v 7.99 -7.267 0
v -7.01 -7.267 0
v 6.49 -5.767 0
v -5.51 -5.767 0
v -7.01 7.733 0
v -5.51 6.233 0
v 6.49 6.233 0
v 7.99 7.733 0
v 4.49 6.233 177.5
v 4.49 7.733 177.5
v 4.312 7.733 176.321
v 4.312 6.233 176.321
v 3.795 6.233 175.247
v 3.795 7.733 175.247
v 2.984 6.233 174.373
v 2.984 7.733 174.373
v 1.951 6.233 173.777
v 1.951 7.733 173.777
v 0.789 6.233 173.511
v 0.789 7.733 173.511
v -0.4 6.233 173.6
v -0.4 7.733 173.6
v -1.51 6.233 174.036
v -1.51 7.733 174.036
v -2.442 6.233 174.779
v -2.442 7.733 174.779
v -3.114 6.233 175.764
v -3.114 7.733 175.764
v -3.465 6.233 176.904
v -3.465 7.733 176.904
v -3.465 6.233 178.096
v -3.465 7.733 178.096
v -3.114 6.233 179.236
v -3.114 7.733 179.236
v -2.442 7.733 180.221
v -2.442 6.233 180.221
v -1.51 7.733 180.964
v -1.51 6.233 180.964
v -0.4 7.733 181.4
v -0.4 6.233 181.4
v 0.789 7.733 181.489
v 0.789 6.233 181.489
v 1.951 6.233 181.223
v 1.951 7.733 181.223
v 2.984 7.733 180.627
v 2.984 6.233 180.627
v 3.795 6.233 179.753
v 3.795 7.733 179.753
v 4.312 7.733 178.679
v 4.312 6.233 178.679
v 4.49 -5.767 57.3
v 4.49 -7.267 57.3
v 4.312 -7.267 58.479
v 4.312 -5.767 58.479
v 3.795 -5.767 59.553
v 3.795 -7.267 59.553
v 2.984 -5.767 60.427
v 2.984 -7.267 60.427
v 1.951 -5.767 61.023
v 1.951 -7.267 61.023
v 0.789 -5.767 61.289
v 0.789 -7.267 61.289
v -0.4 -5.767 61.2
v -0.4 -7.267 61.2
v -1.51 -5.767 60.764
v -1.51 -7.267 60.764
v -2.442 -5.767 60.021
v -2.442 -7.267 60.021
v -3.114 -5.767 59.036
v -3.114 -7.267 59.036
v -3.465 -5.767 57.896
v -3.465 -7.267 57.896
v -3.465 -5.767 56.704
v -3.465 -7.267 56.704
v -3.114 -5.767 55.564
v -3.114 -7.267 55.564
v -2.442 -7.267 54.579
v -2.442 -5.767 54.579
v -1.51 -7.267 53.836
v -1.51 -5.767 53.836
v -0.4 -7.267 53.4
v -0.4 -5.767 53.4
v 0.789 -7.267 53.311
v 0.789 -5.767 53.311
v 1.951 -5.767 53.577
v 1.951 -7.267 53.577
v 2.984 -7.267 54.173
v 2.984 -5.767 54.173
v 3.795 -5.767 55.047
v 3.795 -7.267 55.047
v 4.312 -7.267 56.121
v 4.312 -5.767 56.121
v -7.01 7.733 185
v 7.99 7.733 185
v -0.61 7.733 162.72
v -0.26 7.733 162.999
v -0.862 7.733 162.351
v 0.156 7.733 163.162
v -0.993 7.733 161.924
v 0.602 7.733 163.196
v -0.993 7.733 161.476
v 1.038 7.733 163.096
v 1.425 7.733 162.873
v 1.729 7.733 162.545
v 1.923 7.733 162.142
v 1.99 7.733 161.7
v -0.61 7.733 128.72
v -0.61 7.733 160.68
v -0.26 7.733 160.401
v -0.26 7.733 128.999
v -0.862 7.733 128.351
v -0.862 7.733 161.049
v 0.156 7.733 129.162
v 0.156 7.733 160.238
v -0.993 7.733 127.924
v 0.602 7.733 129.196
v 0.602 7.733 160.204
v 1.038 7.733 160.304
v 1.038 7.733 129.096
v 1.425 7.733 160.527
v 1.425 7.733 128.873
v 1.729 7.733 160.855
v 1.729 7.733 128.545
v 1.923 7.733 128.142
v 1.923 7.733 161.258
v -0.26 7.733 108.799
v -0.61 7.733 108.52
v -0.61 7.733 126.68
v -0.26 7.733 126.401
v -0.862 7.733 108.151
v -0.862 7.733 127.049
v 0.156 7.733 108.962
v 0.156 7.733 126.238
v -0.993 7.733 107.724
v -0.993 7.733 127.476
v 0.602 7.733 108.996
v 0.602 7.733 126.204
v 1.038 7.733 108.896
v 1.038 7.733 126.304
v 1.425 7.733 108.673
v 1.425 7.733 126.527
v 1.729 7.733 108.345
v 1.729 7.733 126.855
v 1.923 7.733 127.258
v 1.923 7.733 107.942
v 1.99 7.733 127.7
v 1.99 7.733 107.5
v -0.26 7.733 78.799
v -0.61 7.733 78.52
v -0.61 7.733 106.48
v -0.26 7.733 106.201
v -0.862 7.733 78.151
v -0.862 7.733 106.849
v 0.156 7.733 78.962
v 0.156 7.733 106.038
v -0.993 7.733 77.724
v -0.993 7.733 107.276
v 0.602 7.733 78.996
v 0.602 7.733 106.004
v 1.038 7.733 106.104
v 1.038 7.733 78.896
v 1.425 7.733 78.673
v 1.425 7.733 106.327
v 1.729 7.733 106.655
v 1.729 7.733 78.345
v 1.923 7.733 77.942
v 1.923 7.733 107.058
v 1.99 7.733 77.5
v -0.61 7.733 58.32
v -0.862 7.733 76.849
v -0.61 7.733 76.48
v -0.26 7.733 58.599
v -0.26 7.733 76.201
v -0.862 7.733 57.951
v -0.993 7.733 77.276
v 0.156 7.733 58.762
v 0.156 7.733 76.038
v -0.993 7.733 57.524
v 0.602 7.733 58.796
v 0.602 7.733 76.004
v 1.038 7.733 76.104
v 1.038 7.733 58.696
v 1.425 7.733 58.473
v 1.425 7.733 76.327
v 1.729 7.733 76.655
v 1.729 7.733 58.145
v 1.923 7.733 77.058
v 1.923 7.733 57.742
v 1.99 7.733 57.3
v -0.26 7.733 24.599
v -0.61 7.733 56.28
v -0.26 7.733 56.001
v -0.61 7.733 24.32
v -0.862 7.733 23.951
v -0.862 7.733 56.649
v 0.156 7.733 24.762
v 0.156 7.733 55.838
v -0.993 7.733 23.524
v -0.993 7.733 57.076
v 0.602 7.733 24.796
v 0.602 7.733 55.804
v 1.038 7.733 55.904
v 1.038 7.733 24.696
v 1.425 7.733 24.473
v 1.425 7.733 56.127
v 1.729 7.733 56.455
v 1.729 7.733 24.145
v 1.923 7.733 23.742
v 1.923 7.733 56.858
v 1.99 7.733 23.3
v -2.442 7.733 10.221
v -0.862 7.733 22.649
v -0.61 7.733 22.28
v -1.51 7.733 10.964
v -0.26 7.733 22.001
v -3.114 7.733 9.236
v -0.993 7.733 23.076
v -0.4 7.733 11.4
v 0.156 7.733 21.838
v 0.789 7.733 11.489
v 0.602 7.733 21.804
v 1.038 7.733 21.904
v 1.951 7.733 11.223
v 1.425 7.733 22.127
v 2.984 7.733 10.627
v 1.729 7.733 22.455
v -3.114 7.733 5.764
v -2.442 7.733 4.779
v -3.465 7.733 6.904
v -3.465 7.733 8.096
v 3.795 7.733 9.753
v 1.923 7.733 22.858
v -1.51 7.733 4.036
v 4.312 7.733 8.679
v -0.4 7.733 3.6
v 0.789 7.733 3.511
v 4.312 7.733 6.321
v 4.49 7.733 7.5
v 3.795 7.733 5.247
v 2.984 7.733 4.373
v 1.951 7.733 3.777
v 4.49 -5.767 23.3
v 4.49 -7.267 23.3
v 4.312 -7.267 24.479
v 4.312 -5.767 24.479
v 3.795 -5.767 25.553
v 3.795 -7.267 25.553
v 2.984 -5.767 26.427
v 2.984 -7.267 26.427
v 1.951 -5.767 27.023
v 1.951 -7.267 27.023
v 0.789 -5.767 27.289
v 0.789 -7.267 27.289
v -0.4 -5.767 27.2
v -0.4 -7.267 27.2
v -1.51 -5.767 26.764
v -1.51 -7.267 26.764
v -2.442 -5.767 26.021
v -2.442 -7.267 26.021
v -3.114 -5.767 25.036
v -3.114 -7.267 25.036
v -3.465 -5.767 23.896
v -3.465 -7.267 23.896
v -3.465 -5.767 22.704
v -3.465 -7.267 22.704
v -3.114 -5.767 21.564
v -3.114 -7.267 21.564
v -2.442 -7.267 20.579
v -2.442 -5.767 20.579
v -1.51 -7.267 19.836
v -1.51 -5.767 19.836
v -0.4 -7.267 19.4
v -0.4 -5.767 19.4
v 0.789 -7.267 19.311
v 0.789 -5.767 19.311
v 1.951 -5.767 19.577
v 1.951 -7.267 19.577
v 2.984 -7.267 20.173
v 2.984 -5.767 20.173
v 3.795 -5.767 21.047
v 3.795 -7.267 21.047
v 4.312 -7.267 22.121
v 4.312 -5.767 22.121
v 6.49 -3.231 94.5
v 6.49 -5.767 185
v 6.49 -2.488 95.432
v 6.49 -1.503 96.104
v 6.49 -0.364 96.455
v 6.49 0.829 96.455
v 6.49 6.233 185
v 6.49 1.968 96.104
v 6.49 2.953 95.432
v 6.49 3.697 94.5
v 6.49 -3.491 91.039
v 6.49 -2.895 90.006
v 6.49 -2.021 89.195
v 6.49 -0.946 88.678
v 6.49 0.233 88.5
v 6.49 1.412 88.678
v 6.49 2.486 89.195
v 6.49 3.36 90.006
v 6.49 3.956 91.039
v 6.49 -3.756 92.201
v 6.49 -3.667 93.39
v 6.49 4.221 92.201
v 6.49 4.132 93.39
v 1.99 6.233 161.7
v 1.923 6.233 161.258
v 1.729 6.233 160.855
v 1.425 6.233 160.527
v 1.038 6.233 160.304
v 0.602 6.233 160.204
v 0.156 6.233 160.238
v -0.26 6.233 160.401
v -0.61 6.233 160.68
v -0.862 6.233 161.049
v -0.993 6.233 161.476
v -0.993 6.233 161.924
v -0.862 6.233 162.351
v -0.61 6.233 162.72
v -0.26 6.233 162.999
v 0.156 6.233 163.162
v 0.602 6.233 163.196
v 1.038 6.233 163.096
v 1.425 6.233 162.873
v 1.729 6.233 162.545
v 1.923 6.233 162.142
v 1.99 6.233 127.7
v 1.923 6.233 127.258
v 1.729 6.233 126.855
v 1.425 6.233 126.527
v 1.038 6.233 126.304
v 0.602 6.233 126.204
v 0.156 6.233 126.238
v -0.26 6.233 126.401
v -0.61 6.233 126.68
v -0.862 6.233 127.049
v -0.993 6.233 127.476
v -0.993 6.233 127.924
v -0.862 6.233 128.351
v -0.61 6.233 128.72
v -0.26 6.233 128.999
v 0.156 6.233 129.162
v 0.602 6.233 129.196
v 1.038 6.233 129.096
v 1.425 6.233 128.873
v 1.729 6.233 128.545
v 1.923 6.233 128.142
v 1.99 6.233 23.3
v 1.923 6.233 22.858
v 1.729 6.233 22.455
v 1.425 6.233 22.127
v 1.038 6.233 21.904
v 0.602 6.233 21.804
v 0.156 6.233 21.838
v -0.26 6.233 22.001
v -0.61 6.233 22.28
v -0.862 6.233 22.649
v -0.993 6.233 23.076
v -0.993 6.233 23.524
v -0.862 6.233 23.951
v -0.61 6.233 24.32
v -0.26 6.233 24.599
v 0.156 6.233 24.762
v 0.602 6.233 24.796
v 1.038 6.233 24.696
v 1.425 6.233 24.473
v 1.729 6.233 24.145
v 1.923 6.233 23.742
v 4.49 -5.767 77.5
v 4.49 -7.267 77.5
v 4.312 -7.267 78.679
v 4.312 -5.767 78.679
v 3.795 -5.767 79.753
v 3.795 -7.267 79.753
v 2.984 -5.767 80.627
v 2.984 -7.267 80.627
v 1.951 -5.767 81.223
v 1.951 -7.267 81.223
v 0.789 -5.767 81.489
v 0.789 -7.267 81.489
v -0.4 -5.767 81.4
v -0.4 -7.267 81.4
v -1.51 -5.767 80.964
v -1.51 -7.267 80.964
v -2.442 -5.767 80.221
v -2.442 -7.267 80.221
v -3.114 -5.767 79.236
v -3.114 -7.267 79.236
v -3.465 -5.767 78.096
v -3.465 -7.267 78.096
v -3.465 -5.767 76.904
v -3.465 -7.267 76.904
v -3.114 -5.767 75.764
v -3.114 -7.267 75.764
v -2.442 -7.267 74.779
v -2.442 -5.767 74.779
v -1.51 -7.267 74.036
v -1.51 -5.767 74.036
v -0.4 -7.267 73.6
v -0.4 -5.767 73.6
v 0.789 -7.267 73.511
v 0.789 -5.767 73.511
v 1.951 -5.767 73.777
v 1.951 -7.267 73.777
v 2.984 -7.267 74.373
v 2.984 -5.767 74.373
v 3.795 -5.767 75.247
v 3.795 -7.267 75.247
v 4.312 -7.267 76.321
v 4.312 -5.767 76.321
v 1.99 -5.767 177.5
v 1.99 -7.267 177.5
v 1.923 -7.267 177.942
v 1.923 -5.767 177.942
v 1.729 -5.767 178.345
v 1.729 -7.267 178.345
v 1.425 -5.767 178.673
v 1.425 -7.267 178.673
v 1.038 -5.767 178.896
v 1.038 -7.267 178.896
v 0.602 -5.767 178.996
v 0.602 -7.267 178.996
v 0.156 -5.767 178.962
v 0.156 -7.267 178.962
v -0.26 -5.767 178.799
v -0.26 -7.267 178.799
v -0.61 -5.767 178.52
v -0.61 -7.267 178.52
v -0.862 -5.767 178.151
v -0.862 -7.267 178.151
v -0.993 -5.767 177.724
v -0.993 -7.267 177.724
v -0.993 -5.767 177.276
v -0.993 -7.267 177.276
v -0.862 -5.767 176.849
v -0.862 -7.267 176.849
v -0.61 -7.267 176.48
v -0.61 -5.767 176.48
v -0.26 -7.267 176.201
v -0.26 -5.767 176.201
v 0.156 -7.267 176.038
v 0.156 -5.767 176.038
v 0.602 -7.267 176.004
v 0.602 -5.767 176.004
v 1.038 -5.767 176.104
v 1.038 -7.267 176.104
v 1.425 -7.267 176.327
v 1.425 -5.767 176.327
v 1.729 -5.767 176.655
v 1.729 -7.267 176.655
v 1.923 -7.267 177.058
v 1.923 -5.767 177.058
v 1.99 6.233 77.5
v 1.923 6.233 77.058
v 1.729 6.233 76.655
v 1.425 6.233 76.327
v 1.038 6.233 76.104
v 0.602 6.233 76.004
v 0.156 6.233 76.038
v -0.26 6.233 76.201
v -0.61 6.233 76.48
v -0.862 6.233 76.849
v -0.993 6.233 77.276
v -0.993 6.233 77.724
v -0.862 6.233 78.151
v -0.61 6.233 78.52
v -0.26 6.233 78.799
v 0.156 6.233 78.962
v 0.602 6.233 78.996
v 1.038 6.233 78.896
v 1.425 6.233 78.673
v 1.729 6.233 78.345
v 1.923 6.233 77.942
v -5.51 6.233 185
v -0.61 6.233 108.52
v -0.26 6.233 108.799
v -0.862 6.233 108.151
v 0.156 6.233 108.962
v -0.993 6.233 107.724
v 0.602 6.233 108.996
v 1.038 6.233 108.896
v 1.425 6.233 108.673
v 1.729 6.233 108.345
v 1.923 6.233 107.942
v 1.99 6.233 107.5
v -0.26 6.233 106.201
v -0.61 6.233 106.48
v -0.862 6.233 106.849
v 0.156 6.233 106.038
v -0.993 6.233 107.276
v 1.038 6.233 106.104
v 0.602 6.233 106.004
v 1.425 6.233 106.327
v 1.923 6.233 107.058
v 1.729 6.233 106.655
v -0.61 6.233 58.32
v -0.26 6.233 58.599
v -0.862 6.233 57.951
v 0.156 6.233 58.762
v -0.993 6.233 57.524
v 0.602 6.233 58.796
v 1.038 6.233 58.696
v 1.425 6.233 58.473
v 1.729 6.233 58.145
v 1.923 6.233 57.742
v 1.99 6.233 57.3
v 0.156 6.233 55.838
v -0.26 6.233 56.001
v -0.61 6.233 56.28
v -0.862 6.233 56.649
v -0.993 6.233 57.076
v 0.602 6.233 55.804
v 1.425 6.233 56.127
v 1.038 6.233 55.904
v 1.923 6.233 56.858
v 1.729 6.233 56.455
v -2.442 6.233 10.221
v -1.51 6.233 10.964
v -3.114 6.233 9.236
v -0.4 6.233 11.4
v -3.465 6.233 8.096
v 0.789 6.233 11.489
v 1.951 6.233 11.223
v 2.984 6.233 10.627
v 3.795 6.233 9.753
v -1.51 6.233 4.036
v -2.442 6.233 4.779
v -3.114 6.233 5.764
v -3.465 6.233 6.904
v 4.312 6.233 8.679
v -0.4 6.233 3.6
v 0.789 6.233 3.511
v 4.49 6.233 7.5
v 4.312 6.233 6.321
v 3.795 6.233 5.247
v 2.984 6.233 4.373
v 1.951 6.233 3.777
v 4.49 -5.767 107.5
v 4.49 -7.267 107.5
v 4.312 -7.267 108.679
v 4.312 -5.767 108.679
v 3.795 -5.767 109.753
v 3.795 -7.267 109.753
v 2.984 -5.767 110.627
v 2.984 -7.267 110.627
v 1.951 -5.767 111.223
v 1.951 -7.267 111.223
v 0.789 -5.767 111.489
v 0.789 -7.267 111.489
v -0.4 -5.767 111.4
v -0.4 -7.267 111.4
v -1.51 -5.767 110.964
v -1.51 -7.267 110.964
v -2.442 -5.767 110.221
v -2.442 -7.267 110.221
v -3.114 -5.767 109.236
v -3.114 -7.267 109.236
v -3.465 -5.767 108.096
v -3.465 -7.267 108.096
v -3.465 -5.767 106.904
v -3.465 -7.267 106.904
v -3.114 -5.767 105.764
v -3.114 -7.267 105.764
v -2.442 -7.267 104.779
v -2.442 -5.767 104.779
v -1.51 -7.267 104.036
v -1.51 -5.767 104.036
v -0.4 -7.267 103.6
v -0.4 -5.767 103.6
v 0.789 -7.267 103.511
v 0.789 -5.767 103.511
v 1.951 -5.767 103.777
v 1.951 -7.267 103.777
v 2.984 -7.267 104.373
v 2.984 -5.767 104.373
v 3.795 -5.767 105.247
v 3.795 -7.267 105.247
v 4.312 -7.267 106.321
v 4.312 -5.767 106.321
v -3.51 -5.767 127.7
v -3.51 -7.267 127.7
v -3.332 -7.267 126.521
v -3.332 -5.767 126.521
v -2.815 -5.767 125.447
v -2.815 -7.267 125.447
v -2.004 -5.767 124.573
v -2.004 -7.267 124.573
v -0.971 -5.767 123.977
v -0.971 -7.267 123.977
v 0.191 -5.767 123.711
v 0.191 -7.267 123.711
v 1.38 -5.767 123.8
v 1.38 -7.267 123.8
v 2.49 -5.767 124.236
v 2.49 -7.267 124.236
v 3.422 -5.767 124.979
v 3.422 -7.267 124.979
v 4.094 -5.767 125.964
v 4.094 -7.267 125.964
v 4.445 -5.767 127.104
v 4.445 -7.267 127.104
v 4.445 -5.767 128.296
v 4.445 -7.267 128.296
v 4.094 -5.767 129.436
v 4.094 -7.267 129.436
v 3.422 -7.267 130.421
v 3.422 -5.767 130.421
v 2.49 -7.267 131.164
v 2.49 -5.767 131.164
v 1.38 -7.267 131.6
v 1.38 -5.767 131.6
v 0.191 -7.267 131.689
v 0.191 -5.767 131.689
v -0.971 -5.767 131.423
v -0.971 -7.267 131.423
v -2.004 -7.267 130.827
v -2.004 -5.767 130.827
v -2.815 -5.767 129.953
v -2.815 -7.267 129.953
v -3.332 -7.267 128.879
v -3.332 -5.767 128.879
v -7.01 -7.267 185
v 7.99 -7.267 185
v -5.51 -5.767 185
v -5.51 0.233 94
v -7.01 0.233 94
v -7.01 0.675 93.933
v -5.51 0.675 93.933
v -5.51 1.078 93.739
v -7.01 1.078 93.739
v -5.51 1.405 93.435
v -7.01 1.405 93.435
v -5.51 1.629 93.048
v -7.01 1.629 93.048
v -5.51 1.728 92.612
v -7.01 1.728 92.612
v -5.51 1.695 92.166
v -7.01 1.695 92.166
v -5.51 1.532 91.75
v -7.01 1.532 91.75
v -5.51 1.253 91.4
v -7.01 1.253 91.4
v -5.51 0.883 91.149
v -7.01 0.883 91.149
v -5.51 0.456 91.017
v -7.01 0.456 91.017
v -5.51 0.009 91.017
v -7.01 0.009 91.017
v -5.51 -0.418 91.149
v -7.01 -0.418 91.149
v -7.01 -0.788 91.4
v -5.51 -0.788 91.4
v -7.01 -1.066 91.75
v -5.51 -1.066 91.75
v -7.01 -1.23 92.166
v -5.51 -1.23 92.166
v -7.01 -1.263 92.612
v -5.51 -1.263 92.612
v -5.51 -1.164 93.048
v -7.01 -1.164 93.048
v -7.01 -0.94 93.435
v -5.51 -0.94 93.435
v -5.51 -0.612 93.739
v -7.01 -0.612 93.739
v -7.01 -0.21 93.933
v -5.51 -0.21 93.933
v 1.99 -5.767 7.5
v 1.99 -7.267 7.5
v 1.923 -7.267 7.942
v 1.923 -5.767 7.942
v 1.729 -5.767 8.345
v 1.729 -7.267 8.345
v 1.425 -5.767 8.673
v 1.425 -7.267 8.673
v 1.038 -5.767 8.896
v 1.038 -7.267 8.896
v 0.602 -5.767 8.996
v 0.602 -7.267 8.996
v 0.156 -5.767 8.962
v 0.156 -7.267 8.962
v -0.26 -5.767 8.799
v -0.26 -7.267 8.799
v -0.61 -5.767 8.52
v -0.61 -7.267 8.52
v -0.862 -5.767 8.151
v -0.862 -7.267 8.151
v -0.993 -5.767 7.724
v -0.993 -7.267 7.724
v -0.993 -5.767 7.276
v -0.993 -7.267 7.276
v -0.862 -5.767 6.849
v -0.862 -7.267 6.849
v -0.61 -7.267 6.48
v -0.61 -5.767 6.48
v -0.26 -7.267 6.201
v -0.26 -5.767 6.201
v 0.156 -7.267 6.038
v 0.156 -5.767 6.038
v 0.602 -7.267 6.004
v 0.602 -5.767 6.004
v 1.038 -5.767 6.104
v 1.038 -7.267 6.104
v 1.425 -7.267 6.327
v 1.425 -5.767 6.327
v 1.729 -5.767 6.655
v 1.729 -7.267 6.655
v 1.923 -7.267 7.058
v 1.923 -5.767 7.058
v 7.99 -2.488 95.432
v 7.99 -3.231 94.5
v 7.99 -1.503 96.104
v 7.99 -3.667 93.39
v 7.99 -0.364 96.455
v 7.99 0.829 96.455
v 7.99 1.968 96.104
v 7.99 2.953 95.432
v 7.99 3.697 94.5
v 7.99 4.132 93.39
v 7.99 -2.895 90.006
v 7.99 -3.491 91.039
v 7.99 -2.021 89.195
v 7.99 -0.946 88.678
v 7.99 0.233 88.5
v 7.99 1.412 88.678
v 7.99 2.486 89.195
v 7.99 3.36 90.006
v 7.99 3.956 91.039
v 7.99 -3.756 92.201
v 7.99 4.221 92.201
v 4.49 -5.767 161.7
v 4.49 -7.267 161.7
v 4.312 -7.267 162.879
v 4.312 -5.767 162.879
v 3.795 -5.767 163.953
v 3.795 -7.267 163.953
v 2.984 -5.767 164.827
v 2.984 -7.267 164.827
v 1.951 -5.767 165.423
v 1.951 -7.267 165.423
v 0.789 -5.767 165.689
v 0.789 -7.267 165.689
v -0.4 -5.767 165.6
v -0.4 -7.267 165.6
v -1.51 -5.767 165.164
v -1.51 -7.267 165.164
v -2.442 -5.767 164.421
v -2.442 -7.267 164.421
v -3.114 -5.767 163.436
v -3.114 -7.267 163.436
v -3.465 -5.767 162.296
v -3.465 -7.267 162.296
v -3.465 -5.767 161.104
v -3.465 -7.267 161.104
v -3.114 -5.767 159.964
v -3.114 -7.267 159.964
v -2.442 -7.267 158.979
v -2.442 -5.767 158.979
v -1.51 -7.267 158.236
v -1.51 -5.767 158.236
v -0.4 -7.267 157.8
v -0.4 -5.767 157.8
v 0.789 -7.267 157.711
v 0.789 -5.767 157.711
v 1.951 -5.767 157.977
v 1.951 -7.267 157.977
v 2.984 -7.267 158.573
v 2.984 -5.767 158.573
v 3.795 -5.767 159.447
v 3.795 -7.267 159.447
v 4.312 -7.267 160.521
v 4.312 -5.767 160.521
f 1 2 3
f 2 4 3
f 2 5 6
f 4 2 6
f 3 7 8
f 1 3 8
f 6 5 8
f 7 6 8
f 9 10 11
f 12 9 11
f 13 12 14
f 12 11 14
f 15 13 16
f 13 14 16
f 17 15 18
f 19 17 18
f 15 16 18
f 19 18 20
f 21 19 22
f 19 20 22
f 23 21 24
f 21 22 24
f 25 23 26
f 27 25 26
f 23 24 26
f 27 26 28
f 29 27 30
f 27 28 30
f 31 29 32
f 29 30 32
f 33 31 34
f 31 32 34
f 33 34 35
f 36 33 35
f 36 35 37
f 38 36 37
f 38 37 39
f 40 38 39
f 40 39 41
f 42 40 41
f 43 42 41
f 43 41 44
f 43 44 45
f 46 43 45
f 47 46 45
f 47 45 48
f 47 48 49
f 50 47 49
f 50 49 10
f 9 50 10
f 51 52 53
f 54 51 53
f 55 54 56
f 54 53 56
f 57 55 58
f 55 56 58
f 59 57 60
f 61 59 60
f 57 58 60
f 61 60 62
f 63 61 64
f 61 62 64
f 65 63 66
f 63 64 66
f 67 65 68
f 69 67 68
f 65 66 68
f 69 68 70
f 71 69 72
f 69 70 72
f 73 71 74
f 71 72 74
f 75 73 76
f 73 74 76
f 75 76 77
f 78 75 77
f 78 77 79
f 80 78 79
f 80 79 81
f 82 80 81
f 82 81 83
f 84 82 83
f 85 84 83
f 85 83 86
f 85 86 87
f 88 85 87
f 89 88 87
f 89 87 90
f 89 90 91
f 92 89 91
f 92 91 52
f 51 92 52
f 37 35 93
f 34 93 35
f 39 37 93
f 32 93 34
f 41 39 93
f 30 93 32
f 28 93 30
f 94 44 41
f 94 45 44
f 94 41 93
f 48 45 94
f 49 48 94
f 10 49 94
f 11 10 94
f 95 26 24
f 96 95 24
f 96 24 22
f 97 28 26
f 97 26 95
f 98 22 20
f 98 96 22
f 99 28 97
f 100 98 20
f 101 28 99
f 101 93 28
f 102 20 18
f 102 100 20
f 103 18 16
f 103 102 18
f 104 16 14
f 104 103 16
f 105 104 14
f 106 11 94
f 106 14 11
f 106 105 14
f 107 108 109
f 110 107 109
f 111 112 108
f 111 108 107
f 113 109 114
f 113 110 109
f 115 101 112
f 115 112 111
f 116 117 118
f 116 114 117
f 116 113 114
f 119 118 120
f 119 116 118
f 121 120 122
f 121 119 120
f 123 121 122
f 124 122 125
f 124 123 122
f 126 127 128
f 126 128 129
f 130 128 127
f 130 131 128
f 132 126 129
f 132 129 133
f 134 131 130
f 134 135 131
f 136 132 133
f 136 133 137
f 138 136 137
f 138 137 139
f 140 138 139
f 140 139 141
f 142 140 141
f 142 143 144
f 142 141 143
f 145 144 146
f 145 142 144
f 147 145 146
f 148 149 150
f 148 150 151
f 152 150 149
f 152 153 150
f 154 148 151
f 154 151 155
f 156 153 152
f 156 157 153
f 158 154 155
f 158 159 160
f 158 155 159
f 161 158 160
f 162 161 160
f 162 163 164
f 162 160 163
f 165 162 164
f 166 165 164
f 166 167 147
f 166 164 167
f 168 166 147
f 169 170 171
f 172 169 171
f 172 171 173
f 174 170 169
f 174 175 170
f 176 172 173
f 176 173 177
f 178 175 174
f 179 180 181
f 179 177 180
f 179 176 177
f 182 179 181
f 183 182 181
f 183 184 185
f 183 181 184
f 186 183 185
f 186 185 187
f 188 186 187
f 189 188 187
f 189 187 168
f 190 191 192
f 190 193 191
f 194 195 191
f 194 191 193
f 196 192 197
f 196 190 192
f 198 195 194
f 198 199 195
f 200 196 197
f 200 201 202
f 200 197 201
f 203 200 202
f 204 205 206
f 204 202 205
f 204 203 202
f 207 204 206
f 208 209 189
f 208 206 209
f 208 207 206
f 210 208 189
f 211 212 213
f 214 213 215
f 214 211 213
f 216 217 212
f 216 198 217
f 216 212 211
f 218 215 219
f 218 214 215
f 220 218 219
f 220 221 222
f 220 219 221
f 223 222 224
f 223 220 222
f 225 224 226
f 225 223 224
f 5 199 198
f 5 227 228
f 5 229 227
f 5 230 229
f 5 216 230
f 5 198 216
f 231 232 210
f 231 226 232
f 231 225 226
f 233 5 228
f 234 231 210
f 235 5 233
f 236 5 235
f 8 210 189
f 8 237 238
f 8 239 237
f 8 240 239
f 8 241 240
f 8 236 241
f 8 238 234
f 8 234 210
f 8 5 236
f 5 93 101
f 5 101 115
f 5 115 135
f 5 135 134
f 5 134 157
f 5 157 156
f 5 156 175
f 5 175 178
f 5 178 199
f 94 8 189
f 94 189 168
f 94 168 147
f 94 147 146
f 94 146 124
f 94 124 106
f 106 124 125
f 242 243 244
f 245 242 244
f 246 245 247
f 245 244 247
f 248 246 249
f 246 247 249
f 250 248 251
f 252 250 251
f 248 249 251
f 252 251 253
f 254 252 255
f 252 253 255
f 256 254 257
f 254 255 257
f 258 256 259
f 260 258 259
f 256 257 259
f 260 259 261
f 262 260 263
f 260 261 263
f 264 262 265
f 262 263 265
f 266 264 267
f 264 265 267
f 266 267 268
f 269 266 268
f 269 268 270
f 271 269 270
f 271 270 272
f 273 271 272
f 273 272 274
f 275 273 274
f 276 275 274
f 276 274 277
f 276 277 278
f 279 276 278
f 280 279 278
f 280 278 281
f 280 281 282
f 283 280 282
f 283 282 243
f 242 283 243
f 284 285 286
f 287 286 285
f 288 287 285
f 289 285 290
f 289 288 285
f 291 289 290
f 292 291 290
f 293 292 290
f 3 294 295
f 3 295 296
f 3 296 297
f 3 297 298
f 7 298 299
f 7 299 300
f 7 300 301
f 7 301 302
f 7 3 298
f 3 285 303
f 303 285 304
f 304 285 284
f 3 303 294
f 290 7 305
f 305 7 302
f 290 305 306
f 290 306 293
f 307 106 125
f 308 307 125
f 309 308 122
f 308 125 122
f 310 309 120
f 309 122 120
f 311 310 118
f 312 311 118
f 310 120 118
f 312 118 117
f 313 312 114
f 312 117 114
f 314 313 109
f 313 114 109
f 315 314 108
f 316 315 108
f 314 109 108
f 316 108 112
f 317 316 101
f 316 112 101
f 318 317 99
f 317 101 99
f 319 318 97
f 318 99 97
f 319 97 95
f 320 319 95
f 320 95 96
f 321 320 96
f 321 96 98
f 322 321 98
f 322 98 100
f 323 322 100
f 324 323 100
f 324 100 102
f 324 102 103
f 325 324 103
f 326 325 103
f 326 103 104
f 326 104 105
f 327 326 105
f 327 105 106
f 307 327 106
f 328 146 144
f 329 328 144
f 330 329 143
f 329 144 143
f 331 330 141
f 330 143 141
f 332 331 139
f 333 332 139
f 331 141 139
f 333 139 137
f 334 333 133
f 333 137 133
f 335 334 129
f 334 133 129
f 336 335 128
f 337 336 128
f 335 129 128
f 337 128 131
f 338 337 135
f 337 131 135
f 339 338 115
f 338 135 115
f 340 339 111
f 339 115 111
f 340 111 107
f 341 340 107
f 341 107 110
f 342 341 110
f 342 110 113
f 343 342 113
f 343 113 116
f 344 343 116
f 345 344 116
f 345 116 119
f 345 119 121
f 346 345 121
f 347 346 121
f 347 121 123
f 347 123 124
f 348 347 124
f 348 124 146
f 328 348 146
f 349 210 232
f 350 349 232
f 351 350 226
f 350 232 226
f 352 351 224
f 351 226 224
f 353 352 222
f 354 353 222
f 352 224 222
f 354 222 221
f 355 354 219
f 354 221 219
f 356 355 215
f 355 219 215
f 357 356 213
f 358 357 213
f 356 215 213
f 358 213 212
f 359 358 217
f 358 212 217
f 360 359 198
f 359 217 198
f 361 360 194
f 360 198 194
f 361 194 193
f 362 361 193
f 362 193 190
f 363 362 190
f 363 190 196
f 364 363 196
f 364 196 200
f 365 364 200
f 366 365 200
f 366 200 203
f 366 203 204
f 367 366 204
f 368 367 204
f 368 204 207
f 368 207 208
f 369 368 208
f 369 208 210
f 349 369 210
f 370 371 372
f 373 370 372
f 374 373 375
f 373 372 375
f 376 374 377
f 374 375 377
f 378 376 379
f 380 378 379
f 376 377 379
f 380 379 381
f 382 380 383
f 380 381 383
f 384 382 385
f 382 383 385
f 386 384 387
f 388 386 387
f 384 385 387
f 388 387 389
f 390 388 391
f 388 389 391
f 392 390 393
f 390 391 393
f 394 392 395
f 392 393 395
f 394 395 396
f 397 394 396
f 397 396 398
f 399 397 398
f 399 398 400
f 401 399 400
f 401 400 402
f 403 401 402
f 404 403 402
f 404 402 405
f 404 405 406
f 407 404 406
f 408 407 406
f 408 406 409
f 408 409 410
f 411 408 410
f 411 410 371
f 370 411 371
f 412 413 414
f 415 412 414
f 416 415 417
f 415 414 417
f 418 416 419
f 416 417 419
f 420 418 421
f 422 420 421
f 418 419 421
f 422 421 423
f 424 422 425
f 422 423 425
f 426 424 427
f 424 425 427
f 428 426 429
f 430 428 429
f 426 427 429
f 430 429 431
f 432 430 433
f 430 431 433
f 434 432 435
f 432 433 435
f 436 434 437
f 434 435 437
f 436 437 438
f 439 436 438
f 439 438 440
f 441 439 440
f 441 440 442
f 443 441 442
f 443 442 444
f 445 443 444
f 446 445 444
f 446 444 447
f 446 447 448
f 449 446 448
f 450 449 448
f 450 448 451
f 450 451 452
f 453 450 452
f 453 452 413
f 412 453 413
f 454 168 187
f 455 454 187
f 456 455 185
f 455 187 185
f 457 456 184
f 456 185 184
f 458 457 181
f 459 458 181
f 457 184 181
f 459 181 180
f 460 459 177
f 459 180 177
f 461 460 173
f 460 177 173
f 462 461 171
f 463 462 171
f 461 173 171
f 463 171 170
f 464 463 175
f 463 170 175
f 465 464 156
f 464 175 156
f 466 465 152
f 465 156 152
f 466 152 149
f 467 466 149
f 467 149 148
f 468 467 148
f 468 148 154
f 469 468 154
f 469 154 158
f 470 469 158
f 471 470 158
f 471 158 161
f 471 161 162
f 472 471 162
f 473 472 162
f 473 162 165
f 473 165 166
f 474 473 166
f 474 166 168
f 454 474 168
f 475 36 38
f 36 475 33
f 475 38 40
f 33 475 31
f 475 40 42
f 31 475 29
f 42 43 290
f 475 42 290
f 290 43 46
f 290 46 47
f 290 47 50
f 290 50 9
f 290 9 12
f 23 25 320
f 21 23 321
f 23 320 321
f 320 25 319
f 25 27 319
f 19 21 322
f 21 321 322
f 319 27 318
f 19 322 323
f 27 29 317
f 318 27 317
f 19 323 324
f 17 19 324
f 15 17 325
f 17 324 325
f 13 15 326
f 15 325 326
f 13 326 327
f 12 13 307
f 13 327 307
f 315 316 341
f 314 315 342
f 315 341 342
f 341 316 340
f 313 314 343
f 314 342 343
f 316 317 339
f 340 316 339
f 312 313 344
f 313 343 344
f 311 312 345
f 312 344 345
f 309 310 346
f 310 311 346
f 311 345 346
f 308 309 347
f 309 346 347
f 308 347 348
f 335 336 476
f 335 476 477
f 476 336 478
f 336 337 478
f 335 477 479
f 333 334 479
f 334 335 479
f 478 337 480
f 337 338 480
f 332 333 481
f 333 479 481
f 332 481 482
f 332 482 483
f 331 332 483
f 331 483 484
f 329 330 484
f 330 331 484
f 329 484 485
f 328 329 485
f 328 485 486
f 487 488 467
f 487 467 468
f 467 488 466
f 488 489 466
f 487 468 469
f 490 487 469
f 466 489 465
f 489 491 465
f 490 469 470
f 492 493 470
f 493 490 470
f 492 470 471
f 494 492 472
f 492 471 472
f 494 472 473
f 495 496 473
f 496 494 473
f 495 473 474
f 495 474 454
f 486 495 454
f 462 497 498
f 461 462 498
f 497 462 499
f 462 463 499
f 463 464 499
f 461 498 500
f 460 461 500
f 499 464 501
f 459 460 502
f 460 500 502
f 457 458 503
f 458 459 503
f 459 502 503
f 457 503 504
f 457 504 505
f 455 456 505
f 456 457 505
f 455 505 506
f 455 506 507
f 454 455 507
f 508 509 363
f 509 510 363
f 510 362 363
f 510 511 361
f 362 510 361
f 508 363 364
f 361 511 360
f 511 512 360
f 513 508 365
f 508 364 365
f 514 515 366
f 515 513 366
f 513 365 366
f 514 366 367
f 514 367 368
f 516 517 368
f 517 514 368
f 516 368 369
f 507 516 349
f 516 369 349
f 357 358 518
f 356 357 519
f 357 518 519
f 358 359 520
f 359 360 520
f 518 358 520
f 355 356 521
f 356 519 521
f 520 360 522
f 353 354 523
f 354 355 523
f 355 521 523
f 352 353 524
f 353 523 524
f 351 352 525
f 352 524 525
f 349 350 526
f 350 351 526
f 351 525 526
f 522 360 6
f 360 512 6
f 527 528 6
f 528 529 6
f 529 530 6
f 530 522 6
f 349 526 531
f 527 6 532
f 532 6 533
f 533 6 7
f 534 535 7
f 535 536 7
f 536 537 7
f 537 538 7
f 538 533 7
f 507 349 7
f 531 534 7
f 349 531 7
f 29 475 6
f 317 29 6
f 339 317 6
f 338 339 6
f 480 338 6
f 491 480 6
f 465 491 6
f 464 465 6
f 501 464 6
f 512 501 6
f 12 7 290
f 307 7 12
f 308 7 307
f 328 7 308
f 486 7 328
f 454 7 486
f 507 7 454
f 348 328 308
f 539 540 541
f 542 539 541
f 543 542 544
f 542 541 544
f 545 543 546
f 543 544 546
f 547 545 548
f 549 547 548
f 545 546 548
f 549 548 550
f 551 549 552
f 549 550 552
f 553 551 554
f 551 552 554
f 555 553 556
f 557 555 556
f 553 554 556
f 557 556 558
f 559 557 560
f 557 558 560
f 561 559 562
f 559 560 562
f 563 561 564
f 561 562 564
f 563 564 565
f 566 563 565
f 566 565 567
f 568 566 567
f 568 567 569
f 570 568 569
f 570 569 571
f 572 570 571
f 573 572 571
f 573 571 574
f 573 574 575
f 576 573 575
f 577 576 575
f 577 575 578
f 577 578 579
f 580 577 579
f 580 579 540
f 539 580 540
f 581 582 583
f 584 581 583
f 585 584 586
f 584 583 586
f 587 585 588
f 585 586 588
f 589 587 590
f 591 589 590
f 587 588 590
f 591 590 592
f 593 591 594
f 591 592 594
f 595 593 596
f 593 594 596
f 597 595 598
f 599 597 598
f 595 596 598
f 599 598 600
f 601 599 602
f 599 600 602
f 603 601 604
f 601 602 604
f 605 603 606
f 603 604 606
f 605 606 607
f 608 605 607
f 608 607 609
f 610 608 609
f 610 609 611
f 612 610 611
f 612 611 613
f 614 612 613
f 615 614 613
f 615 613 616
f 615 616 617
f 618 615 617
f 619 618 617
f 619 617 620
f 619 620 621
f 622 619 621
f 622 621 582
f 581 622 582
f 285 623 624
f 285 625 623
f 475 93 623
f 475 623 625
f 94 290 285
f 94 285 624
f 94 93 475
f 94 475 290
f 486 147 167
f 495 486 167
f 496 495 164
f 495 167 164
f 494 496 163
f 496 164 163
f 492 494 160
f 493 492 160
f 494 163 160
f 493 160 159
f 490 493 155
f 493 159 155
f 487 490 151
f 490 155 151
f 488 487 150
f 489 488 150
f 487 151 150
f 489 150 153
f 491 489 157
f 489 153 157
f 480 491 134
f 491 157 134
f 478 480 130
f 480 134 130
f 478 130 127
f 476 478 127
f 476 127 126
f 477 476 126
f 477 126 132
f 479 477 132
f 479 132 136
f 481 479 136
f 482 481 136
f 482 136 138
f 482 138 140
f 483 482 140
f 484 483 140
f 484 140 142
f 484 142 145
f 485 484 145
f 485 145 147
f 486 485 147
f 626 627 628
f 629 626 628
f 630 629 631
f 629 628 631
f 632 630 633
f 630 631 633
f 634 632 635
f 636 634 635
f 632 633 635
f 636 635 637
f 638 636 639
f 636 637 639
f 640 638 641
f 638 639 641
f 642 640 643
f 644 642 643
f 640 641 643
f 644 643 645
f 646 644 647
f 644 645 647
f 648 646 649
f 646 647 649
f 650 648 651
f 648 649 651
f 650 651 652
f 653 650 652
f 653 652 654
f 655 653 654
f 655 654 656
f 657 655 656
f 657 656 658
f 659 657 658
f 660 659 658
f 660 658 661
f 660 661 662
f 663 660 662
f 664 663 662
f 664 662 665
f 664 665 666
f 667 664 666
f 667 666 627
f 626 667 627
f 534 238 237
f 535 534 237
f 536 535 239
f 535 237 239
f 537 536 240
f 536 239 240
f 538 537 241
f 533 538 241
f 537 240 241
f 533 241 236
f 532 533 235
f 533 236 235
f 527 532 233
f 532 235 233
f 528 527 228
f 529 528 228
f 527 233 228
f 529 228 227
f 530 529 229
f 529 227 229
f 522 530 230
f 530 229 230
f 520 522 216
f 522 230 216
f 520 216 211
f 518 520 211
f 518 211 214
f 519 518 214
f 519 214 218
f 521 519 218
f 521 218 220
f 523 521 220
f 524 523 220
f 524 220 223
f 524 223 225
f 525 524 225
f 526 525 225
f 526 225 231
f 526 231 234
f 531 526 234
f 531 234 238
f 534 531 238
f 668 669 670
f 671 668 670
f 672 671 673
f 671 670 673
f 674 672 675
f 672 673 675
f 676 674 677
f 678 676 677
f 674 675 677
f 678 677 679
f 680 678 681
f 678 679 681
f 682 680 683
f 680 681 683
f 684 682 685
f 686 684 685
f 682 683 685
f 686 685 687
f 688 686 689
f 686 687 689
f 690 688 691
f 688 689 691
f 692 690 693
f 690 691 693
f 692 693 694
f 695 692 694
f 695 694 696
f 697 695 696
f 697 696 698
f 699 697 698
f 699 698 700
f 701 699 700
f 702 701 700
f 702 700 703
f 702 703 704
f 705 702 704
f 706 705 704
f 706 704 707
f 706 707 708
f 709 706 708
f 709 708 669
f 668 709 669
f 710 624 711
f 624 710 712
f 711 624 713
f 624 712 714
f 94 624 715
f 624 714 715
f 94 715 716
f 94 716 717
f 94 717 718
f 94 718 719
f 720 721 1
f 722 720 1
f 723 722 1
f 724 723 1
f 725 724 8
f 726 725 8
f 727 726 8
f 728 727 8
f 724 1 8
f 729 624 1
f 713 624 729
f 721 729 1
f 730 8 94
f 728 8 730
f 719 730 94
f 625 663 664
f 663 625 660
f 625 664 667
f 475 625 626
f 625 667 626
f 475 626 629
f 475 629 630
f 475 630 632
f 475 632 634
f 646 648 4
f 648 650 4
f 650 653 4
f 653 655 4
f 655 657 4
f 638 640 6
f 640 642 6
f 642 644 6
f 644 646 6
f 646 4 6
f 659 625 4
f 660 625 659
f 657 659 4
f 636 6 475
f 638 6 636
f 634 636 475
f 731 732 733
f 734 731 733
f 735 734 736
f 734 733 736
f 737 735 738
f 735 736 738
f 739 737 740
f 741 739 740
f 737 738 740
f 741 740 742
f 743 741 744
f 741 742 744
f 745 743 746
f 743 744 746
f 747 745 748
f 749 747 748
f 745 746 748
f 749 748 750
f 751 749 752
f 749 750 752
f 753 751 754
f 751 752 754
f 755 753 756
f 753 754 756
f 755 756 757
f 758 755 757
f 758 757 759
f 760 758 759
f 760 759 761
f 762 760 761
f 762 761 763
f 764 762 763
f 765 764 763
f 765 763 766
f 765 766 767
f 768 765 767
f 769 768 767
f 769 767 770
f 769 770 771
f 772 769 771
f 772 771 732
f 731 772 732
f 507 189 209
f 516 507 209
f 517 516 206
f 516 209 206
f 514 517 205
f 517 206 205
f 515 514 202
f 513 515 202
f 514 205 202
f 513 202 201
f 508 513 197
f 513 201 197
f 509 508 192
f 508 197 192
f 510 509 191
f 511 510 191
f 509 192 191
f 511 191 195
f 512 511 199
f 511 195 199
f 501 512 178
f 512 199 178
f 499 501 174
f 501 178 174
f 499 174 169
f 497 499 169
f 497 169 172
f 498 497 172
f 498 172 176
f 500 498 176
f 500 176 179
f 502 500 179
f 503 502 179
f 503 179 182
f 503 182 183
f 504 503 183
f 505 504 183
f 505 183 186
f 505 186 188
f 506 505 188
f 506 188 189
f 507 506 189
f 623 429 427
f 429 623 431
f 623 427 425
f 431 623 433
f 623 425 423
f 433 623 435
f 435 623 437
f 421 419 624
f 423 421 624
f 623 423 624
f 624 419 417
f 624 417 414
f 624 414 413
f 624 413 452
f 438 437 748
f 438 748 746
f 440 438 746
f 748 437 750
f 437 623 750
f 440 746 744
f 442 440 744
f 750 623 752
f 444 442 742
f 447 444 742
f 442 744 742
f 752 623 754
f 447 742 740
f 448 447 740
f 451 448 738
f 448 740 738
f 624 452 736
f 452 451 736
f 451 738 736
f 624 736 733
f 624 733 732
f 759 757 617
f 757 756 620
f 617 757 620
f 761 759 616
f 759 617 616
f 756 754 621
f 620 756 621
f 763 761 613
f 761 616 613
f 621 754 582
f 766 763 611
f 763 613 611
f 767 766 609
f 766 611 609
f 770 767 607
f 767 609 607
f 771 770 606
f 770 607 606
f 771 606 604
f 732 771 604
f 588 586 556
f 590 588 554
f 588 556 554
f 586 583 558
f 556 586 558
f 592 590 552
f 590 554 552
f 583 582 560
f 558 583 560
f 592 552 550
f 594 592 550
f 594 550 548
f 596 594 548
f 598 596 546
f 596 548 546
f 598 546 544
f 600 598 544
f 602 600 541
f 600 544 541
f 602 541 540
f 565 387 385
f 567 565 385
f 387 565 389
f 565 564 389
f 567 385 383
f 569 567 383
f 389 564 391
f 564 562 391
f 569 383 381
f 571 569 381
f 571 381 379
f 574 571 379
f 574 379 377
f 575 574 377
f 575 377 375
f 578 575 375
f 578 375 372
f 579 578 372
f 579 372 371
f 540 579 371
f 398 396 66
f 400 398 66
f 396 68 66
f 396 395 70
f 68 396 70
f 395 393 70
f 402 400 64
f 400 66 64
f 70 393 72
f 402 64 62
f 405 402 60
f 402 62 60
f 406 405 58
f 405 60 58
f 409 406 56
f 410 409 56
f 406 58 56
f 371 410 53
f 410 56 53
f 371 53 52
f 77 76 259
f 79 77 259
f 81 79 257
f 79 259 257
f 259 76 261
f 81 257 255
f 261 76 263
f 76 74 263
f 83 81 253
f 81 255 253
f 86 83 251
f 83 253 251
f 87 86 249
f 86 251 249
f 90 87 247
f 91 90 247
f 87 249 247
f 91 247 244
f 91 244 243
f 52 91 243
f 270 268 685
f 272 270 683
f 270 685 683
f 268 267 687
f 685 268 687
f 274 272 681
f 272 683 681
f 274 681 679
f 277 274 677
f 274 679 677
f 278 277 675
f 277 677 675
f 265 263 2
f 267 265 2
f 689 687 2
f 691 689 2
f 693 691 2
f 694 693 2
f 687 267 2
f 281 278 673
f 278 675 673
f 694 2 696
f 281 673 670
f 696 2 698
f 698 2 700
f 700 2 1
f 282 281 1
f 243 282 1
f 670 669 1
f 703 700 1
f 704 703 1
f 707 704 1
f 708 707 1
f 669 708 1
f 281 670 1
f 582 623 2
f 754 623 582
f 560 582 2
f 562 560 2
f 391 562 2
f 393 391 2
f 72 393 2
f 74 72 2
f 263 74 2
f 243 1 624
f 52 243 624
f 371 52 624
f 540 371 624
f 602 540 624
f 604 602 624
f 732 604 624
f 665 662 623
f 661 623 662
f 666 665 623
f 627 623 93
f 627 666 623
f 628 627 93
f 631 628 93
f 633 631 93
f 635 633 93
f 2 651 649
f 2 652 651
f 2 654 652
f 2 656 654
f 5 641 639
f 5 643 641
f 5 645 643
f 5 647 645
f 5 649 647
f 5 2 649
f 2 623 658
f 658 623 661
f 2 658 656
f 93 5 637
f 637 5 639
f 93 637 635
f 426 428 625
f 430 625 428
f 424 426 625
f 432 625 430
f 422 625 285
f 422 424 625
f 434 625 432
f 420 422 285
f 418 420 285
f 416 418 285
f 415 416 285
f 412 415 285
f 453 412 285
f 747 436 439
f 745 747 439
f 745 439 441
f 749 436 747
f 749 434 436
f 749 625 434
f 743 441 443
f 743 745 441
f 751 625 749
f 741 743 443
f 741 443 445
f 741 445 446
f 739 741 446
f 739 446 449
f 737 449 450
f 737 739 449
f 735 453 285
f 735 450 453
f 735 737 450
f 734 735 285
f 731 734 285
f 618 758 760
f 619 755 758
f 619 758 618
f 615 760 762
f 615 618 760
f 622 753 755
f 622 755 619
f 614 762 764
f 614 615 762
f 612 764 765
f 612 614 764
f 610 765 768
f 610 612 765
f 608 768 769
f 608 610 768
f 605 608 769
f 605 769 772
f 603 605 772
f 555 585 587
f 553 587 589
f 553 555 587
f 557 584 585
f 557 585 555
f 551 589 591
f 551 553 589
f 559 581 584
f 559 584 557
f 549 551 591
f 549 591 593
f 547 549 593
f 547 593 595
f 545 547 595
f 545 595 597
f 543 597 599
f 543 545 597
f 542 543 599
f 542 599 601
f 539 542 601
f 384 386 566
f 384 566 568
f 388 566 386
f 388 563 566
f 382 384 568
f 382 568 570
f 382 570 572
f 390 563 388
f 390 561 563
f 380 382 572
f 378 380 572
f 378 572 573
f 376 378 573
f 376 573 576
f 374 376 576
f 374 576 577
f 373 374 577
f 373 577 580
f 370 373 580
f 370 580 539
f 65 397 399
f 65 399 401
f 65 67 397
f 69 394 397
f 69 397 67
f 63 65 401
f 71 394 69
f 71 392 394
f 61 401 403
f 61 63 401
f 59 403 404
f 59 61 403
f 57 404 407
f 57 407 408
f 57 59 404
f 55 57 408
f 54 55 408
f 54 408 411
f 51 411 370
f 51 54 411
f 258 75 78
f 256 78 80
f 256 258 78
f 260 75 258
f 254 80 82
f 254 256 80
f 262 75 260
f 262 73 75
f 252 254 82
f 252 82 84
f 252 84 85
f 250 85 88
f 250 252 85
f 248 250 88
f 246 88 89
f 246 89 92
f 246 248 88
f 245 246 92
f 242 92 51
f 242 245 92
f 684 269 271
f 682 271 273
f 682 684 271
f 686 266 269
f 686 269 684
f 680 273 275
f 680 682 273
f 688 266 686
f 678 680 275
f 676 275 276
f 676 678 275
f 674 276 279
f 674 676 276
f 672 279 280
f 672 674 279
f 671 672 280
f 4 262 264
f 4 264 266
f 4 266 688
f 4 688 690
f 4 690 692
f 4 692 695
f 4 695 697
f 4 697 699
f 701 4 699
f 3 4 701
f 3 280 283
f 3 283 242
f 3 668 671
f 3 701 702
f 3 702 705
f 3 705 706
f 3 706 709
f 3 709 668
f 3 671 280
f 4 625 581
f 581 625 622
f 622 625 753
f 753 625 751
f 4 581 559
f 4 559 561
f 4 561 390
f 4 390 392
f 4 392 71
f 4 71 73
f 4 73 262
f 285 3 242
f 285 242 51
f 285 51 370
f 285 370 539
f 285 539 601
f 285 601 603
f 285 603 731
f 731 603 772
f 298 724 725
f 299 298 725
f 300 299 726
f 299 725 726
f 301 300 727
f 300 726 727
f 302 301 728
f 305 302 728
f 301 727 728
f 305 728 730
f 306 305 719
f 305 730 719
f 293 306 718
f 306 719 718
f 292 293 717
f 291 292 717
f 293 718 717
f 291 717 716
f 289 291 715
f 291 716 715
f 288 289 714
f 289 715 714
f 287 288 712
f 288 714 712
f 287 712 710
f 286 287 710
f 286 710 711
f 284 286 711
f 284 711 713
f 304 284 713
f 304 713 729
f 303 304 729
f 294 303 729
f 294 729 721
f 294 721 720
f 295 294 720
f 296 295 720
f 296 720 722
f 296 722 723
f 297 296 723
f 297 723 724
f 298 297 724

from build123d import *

# Parameters (mm, degrees)
SKETCH_1_W           = 15
SKETCH_1_H           = 15
SKETCH_1_W_2         = 12
SKETCH_1_H_2         = 12
EXTRUDE_2_DEPTH      = 185
SKETCH_2_R           = 4
CUT_EXTRUDE_1_DEPTH  = 10
SKETCH_3_R           = 1.5
CUT_EXTRUDE_2_DEPTH  = 10
SKETCH_4_R           = 4
CUT_EXTRUDE_3_DEPTH  = 10
SKETCH_5_R           = 1.5
CUT_EXTRUDE_4_DEPTH  = 10
SKETCH_6_R           = 1.5
CUT_EXTRUDE_5_DEPTH  = 10
SKETCH_7_R           = 4
CUT_EXTRUDE_6_DEPTH  = 10
SKETCH_8_R           = 1.5
CUT_EXTRUDE_7_DEPTH  = 10
SKETCH_9_R           = 1.5
CUT_EXTRUDE_8_DEPTH  = 10
SKETCH_10_R          = 4
CUT_EXTRUDE_9_DEPTH  = 10
SKETCH_11_R          = 4
CUT_EXTRUDE_10_DEPTH = 10
SKETCH_12_R          = 1.5
CUT_EXTRUDE_11_DEPTH = 10
SKETCH_14_R          = 1.5
CUT_EXTRUDE_12_DEPTH = 10
SKETCH_15_R          = 4
CUT_EXTRUDE_13_DEPTH = 10
SKETCH_16_R          = 4
CUT_EXTRUDE_14_DEPTH = 10
SKETCH_18_R          = 1.5
CUT_EXTRUDE_15_DEPTH = 10
SKETCH_19_R          = 1.5
CUT_EXTRUDE_16_DEPTH = 10
SKETCH_20_R          = 4
CUT_EXTRUDE_17_DEPTH = 10
SKETCH_21_R          = 4
CUT_EXTRUDE_18_DEPTH = 10


with BuildPart() as part:
    # ｽｹｯﾁ1 → ﾎﾞｽ - 押し出し2 (new body)
    with BuildSketch(Plane.XY):
        with Locations((0.489915859, 0.232626086)):
            Rectangle(SKETCH_1_W, SKETCH_1_H)
        with Locations((0.489915859, 0.232626086)):
            Rectangle(SKETCH_1_W_2, SKETCH_1_H_2, mode=Mode.SUBTRACT)
    extrude(amount=EXTRUDE_2_DEPTH)

    # ｽｹｯﾁ2 → ｶｯﾄ - 押し出し1 (cut)
    with BuildSketch(Plane(origin=(0, 7.732626086, 0), x_dir=(1, 0, 0), z_dir=(0, 1, 0))):
        with Locations((0.489915859, -177.5)):
            Circle(SKETCH_2_R)
    extrude(amount=-CUT_EXTRUDE_1_DEPTH, mode=Mode.SUBTRACT)

    # ｽｹｯﾁ3 → ｶｯﾄ - 押し出し2 (cut)
    with BuildSketch(Plane.XZ.offset(7.267373914)):
        with Locations((0.489915859, 177.5)):
            Circle(SKETCH_3_R)
    extrude(amount=-CUT_EXTRUDE_2_DEPTH, mode=Mode.SUBTRACT)

    # ｽｹｯﾁ4 → ｶｯﾄ - 押し出し3 (cut)
    with BuildSketch(Plane(origin=(0, 7.732626086, 0), x_dir=(1, 0, 0), z_dir=(0, 1, 0))):
        with Locations((0.489915859, -7.5)):
            Circle(SKETCH_4_R)
    extrude(amount=-CUT_EXTRUDE_3_DEPTH, mode=Mode.SUBTRACT)

    # ｽｹｯﾁ5 → ｶｯﾄ - 押し出し4 (cut)
    with BuildSketch(Plane.XZ.offset(7.267373914)):
        with Locations((0.489915859, 7.5)):
            Circle(SKETCH_5_R)
    extrude(amount=-CUT_EXTRUDE_4_DEPTH, mode=Mode.SUBTRACT)

    # ｽｹｯﾁ6 → ｶｯﾄ - 押し出し5 (cut)
    with BuildSketch(Plane.ZY.offset(7.010084141)):
        with Locations((92.5, 0.232626086)):
            Circle(SKETCH_6_R)
    extrude(amount=-CUT_EXTRUDE_5_DEPTH, mode=Mode.SUBTRACT)

    # ｽｹｯﾁ7 → ｶｯﾄ - 押し出し6 (cut)
    with BuildSketch(Plane(origin=(7.989915859, 0, 0), x_dir=(0, 0, -1), z_dir=(1, 0, 0))):
        with Locations((-92.5, 0.232626086)):
            Circle(SKETCH_7_R)
    extrude(amount=-CUT_EXTRUDE_6_DEPTH, mode=Mode.SUBTRACT)

    # ｽｹｯﾁ8 → ｶｯﾄ - 押し出し7 (cut)
    with BuildSketch(Plane(origin=(0, 7.732626086, 0), x_dir=(1, 0, 0), z_dir=(0, 1, 0))):
        with Locations((0.489915859, -77.5)):
            Circle(SKETCH_8_R)
    extrude(amount=-CUT_EXTRUDE_7_DEPTH, mode=Mode.SUBTRACT)

    # ｽｹｯﾁ9 → ｶｯﾄ - 押し出し8 (cut)
    with BuildSketch(Plane(origin=(0, 7.732626086, 0), x_dir=(1, 0, 0), z_dir=(0, 1, 0))):
        with Locations((0.489915859, -107.5)):
            Circle(SKETCH_9_R)
    extrude(amount=-CUT_EXTRUDE_8_DEPTH, mode=Mode.SUBTRACT)

    # ｽｹｯﾁ10 → ｶｯﾄ - 押し出し9 (cut)
    with BuildSketch(Plane.XZ.offset(7.267373914)):
        with Locations((0.489915859, 77.5)):
            Circle(SKETCH_10_R)
    extrude(amount=-CUT_EXTRUDE_9_DEPTH, mode=Mode.SUBTRACT)

    # ｽｹｯﾁ11 → ｶｯﾄ - 押し出し10 (cut)
    with BuildSketch(Plane.XZ.offset(7.267373914)):
        with Locations((0.489915859, 107.5)):
            Circle(SKETCH_11_R)
    extrude(amount=-CUT_EXTRUDE_10_DEPTH, mode=Mode.SUBTRACT)

    # ｽｹｯﾁ12 → ｶｯﾄ - 押し出し11 (cut)
    with BuildSketch(Plane(origin=(0, 7.732626086, 0), x_dir=(1, 0, 0), z_dir=(0, 1, 0))):
        with Locations((0.489915859, -23.3)):
            Circle(SKETCH_12_R)
    extrude(amount=-CUT_EXTRUDE_11_DEPTH, mode=Mode.SUBTRACT)

    # ｽｹｯﾁ14 → ｶｯﾄ - 押し出し12 (cut)
    with BuildSketch(Plane(origin=(0, 7.732626086, 0), x_dir=(1, 0, 0), z_dir=(0, 1, 0))):
        with Locations((0.489915859, -57.3)):
            Circle(SKETCH_14_R)
    extrude(amount=-CUT_EXTRUDE_12_DEPTH, mode=Mode.SUBTRACT)

    # ｽｹｯﾁ15 → ｶｯﾄ - 押し出し13 (cut)
    with BuildSketch(Plane.XZ.offset(7.267373914)):
        with Locations((0.489915859, 23.3)):
            Circle(SKETCH_15_R)
    extrude(amount=-CUT_EXTRUDE_13_DEPTH, mode=Mode.SUBTRACT)

    # ｽｹｯﾁ16 → ｶｯﾄ - 押し出し14 (cut)
    with BuildSketch(Plane.XZ.offset(7.267373914)):
        with Locations((0.489915859, 57.3)):
            Circle(SKETCH_16_R)
    extrude(amount=-CUT_EXTRUDE_14_DEPTH, mode=Mode.SUBTRACT)

    # ｽｹｯﾁ18 → ｶｯﾄ - 押し出し15 (cut)
    with BuildSketch(Plane(origin=(0, 7.732626086, 0), x_dir=(1, 0, 0), z_dir=(0, 1, 0))):
        with Locations((0.489915859, -161.7)):
            Circle(SKETCH_18_R)
    extrude(amount=-CUT_EXTRUDE_15_DEPTH, mode=Mode.SUBTRACT)

    # ｽｹｯﾁ19 → ｶｯﾄ - 押し出し16 (cut)
    with BuildSketch(Plane(origin=(0, 7.732626086, 0), x_dir=(1, 0, 0), z_dir=(0, 1, 0))):
        with Locations((0.489915859, -127.7)):
            Circle(SKETCH_19_R)
    extrude(amount=-CUT_EXTRUDE_16_DEPTH, mode=Mode.SUBTRACT)

    # ｽｹｯﾁ20 → ｶｯﾄ - 押し出し17 (cut)
    with BuildSketch(Plane.XZ.offset(7.267373914)):
        with Locations((0.489915859, 161.7)):
            Circle(SKETCH_20_R)
    extrude(amount=-CUT_EXTRUDE_17_DEPTH, mode=Mode.SUBTRACT)

    # ｽｹｯﾁ21 → ｶｯﾄ - 押し出し18 (cut)
    with BuildSketch(Plane(origin=(0, -7.267373914, 0), x_dir=(-1, 0, 0), z_dir=(0, -1, 0))):
        with Locations((-0.489915859, -127.7)):
            Circle(SKETCH_21_R)
    extrude(amount=-CUT_EXTRUDE_18_DEPTH, mode=Mode.SUBTRACT)


solid = part.part
